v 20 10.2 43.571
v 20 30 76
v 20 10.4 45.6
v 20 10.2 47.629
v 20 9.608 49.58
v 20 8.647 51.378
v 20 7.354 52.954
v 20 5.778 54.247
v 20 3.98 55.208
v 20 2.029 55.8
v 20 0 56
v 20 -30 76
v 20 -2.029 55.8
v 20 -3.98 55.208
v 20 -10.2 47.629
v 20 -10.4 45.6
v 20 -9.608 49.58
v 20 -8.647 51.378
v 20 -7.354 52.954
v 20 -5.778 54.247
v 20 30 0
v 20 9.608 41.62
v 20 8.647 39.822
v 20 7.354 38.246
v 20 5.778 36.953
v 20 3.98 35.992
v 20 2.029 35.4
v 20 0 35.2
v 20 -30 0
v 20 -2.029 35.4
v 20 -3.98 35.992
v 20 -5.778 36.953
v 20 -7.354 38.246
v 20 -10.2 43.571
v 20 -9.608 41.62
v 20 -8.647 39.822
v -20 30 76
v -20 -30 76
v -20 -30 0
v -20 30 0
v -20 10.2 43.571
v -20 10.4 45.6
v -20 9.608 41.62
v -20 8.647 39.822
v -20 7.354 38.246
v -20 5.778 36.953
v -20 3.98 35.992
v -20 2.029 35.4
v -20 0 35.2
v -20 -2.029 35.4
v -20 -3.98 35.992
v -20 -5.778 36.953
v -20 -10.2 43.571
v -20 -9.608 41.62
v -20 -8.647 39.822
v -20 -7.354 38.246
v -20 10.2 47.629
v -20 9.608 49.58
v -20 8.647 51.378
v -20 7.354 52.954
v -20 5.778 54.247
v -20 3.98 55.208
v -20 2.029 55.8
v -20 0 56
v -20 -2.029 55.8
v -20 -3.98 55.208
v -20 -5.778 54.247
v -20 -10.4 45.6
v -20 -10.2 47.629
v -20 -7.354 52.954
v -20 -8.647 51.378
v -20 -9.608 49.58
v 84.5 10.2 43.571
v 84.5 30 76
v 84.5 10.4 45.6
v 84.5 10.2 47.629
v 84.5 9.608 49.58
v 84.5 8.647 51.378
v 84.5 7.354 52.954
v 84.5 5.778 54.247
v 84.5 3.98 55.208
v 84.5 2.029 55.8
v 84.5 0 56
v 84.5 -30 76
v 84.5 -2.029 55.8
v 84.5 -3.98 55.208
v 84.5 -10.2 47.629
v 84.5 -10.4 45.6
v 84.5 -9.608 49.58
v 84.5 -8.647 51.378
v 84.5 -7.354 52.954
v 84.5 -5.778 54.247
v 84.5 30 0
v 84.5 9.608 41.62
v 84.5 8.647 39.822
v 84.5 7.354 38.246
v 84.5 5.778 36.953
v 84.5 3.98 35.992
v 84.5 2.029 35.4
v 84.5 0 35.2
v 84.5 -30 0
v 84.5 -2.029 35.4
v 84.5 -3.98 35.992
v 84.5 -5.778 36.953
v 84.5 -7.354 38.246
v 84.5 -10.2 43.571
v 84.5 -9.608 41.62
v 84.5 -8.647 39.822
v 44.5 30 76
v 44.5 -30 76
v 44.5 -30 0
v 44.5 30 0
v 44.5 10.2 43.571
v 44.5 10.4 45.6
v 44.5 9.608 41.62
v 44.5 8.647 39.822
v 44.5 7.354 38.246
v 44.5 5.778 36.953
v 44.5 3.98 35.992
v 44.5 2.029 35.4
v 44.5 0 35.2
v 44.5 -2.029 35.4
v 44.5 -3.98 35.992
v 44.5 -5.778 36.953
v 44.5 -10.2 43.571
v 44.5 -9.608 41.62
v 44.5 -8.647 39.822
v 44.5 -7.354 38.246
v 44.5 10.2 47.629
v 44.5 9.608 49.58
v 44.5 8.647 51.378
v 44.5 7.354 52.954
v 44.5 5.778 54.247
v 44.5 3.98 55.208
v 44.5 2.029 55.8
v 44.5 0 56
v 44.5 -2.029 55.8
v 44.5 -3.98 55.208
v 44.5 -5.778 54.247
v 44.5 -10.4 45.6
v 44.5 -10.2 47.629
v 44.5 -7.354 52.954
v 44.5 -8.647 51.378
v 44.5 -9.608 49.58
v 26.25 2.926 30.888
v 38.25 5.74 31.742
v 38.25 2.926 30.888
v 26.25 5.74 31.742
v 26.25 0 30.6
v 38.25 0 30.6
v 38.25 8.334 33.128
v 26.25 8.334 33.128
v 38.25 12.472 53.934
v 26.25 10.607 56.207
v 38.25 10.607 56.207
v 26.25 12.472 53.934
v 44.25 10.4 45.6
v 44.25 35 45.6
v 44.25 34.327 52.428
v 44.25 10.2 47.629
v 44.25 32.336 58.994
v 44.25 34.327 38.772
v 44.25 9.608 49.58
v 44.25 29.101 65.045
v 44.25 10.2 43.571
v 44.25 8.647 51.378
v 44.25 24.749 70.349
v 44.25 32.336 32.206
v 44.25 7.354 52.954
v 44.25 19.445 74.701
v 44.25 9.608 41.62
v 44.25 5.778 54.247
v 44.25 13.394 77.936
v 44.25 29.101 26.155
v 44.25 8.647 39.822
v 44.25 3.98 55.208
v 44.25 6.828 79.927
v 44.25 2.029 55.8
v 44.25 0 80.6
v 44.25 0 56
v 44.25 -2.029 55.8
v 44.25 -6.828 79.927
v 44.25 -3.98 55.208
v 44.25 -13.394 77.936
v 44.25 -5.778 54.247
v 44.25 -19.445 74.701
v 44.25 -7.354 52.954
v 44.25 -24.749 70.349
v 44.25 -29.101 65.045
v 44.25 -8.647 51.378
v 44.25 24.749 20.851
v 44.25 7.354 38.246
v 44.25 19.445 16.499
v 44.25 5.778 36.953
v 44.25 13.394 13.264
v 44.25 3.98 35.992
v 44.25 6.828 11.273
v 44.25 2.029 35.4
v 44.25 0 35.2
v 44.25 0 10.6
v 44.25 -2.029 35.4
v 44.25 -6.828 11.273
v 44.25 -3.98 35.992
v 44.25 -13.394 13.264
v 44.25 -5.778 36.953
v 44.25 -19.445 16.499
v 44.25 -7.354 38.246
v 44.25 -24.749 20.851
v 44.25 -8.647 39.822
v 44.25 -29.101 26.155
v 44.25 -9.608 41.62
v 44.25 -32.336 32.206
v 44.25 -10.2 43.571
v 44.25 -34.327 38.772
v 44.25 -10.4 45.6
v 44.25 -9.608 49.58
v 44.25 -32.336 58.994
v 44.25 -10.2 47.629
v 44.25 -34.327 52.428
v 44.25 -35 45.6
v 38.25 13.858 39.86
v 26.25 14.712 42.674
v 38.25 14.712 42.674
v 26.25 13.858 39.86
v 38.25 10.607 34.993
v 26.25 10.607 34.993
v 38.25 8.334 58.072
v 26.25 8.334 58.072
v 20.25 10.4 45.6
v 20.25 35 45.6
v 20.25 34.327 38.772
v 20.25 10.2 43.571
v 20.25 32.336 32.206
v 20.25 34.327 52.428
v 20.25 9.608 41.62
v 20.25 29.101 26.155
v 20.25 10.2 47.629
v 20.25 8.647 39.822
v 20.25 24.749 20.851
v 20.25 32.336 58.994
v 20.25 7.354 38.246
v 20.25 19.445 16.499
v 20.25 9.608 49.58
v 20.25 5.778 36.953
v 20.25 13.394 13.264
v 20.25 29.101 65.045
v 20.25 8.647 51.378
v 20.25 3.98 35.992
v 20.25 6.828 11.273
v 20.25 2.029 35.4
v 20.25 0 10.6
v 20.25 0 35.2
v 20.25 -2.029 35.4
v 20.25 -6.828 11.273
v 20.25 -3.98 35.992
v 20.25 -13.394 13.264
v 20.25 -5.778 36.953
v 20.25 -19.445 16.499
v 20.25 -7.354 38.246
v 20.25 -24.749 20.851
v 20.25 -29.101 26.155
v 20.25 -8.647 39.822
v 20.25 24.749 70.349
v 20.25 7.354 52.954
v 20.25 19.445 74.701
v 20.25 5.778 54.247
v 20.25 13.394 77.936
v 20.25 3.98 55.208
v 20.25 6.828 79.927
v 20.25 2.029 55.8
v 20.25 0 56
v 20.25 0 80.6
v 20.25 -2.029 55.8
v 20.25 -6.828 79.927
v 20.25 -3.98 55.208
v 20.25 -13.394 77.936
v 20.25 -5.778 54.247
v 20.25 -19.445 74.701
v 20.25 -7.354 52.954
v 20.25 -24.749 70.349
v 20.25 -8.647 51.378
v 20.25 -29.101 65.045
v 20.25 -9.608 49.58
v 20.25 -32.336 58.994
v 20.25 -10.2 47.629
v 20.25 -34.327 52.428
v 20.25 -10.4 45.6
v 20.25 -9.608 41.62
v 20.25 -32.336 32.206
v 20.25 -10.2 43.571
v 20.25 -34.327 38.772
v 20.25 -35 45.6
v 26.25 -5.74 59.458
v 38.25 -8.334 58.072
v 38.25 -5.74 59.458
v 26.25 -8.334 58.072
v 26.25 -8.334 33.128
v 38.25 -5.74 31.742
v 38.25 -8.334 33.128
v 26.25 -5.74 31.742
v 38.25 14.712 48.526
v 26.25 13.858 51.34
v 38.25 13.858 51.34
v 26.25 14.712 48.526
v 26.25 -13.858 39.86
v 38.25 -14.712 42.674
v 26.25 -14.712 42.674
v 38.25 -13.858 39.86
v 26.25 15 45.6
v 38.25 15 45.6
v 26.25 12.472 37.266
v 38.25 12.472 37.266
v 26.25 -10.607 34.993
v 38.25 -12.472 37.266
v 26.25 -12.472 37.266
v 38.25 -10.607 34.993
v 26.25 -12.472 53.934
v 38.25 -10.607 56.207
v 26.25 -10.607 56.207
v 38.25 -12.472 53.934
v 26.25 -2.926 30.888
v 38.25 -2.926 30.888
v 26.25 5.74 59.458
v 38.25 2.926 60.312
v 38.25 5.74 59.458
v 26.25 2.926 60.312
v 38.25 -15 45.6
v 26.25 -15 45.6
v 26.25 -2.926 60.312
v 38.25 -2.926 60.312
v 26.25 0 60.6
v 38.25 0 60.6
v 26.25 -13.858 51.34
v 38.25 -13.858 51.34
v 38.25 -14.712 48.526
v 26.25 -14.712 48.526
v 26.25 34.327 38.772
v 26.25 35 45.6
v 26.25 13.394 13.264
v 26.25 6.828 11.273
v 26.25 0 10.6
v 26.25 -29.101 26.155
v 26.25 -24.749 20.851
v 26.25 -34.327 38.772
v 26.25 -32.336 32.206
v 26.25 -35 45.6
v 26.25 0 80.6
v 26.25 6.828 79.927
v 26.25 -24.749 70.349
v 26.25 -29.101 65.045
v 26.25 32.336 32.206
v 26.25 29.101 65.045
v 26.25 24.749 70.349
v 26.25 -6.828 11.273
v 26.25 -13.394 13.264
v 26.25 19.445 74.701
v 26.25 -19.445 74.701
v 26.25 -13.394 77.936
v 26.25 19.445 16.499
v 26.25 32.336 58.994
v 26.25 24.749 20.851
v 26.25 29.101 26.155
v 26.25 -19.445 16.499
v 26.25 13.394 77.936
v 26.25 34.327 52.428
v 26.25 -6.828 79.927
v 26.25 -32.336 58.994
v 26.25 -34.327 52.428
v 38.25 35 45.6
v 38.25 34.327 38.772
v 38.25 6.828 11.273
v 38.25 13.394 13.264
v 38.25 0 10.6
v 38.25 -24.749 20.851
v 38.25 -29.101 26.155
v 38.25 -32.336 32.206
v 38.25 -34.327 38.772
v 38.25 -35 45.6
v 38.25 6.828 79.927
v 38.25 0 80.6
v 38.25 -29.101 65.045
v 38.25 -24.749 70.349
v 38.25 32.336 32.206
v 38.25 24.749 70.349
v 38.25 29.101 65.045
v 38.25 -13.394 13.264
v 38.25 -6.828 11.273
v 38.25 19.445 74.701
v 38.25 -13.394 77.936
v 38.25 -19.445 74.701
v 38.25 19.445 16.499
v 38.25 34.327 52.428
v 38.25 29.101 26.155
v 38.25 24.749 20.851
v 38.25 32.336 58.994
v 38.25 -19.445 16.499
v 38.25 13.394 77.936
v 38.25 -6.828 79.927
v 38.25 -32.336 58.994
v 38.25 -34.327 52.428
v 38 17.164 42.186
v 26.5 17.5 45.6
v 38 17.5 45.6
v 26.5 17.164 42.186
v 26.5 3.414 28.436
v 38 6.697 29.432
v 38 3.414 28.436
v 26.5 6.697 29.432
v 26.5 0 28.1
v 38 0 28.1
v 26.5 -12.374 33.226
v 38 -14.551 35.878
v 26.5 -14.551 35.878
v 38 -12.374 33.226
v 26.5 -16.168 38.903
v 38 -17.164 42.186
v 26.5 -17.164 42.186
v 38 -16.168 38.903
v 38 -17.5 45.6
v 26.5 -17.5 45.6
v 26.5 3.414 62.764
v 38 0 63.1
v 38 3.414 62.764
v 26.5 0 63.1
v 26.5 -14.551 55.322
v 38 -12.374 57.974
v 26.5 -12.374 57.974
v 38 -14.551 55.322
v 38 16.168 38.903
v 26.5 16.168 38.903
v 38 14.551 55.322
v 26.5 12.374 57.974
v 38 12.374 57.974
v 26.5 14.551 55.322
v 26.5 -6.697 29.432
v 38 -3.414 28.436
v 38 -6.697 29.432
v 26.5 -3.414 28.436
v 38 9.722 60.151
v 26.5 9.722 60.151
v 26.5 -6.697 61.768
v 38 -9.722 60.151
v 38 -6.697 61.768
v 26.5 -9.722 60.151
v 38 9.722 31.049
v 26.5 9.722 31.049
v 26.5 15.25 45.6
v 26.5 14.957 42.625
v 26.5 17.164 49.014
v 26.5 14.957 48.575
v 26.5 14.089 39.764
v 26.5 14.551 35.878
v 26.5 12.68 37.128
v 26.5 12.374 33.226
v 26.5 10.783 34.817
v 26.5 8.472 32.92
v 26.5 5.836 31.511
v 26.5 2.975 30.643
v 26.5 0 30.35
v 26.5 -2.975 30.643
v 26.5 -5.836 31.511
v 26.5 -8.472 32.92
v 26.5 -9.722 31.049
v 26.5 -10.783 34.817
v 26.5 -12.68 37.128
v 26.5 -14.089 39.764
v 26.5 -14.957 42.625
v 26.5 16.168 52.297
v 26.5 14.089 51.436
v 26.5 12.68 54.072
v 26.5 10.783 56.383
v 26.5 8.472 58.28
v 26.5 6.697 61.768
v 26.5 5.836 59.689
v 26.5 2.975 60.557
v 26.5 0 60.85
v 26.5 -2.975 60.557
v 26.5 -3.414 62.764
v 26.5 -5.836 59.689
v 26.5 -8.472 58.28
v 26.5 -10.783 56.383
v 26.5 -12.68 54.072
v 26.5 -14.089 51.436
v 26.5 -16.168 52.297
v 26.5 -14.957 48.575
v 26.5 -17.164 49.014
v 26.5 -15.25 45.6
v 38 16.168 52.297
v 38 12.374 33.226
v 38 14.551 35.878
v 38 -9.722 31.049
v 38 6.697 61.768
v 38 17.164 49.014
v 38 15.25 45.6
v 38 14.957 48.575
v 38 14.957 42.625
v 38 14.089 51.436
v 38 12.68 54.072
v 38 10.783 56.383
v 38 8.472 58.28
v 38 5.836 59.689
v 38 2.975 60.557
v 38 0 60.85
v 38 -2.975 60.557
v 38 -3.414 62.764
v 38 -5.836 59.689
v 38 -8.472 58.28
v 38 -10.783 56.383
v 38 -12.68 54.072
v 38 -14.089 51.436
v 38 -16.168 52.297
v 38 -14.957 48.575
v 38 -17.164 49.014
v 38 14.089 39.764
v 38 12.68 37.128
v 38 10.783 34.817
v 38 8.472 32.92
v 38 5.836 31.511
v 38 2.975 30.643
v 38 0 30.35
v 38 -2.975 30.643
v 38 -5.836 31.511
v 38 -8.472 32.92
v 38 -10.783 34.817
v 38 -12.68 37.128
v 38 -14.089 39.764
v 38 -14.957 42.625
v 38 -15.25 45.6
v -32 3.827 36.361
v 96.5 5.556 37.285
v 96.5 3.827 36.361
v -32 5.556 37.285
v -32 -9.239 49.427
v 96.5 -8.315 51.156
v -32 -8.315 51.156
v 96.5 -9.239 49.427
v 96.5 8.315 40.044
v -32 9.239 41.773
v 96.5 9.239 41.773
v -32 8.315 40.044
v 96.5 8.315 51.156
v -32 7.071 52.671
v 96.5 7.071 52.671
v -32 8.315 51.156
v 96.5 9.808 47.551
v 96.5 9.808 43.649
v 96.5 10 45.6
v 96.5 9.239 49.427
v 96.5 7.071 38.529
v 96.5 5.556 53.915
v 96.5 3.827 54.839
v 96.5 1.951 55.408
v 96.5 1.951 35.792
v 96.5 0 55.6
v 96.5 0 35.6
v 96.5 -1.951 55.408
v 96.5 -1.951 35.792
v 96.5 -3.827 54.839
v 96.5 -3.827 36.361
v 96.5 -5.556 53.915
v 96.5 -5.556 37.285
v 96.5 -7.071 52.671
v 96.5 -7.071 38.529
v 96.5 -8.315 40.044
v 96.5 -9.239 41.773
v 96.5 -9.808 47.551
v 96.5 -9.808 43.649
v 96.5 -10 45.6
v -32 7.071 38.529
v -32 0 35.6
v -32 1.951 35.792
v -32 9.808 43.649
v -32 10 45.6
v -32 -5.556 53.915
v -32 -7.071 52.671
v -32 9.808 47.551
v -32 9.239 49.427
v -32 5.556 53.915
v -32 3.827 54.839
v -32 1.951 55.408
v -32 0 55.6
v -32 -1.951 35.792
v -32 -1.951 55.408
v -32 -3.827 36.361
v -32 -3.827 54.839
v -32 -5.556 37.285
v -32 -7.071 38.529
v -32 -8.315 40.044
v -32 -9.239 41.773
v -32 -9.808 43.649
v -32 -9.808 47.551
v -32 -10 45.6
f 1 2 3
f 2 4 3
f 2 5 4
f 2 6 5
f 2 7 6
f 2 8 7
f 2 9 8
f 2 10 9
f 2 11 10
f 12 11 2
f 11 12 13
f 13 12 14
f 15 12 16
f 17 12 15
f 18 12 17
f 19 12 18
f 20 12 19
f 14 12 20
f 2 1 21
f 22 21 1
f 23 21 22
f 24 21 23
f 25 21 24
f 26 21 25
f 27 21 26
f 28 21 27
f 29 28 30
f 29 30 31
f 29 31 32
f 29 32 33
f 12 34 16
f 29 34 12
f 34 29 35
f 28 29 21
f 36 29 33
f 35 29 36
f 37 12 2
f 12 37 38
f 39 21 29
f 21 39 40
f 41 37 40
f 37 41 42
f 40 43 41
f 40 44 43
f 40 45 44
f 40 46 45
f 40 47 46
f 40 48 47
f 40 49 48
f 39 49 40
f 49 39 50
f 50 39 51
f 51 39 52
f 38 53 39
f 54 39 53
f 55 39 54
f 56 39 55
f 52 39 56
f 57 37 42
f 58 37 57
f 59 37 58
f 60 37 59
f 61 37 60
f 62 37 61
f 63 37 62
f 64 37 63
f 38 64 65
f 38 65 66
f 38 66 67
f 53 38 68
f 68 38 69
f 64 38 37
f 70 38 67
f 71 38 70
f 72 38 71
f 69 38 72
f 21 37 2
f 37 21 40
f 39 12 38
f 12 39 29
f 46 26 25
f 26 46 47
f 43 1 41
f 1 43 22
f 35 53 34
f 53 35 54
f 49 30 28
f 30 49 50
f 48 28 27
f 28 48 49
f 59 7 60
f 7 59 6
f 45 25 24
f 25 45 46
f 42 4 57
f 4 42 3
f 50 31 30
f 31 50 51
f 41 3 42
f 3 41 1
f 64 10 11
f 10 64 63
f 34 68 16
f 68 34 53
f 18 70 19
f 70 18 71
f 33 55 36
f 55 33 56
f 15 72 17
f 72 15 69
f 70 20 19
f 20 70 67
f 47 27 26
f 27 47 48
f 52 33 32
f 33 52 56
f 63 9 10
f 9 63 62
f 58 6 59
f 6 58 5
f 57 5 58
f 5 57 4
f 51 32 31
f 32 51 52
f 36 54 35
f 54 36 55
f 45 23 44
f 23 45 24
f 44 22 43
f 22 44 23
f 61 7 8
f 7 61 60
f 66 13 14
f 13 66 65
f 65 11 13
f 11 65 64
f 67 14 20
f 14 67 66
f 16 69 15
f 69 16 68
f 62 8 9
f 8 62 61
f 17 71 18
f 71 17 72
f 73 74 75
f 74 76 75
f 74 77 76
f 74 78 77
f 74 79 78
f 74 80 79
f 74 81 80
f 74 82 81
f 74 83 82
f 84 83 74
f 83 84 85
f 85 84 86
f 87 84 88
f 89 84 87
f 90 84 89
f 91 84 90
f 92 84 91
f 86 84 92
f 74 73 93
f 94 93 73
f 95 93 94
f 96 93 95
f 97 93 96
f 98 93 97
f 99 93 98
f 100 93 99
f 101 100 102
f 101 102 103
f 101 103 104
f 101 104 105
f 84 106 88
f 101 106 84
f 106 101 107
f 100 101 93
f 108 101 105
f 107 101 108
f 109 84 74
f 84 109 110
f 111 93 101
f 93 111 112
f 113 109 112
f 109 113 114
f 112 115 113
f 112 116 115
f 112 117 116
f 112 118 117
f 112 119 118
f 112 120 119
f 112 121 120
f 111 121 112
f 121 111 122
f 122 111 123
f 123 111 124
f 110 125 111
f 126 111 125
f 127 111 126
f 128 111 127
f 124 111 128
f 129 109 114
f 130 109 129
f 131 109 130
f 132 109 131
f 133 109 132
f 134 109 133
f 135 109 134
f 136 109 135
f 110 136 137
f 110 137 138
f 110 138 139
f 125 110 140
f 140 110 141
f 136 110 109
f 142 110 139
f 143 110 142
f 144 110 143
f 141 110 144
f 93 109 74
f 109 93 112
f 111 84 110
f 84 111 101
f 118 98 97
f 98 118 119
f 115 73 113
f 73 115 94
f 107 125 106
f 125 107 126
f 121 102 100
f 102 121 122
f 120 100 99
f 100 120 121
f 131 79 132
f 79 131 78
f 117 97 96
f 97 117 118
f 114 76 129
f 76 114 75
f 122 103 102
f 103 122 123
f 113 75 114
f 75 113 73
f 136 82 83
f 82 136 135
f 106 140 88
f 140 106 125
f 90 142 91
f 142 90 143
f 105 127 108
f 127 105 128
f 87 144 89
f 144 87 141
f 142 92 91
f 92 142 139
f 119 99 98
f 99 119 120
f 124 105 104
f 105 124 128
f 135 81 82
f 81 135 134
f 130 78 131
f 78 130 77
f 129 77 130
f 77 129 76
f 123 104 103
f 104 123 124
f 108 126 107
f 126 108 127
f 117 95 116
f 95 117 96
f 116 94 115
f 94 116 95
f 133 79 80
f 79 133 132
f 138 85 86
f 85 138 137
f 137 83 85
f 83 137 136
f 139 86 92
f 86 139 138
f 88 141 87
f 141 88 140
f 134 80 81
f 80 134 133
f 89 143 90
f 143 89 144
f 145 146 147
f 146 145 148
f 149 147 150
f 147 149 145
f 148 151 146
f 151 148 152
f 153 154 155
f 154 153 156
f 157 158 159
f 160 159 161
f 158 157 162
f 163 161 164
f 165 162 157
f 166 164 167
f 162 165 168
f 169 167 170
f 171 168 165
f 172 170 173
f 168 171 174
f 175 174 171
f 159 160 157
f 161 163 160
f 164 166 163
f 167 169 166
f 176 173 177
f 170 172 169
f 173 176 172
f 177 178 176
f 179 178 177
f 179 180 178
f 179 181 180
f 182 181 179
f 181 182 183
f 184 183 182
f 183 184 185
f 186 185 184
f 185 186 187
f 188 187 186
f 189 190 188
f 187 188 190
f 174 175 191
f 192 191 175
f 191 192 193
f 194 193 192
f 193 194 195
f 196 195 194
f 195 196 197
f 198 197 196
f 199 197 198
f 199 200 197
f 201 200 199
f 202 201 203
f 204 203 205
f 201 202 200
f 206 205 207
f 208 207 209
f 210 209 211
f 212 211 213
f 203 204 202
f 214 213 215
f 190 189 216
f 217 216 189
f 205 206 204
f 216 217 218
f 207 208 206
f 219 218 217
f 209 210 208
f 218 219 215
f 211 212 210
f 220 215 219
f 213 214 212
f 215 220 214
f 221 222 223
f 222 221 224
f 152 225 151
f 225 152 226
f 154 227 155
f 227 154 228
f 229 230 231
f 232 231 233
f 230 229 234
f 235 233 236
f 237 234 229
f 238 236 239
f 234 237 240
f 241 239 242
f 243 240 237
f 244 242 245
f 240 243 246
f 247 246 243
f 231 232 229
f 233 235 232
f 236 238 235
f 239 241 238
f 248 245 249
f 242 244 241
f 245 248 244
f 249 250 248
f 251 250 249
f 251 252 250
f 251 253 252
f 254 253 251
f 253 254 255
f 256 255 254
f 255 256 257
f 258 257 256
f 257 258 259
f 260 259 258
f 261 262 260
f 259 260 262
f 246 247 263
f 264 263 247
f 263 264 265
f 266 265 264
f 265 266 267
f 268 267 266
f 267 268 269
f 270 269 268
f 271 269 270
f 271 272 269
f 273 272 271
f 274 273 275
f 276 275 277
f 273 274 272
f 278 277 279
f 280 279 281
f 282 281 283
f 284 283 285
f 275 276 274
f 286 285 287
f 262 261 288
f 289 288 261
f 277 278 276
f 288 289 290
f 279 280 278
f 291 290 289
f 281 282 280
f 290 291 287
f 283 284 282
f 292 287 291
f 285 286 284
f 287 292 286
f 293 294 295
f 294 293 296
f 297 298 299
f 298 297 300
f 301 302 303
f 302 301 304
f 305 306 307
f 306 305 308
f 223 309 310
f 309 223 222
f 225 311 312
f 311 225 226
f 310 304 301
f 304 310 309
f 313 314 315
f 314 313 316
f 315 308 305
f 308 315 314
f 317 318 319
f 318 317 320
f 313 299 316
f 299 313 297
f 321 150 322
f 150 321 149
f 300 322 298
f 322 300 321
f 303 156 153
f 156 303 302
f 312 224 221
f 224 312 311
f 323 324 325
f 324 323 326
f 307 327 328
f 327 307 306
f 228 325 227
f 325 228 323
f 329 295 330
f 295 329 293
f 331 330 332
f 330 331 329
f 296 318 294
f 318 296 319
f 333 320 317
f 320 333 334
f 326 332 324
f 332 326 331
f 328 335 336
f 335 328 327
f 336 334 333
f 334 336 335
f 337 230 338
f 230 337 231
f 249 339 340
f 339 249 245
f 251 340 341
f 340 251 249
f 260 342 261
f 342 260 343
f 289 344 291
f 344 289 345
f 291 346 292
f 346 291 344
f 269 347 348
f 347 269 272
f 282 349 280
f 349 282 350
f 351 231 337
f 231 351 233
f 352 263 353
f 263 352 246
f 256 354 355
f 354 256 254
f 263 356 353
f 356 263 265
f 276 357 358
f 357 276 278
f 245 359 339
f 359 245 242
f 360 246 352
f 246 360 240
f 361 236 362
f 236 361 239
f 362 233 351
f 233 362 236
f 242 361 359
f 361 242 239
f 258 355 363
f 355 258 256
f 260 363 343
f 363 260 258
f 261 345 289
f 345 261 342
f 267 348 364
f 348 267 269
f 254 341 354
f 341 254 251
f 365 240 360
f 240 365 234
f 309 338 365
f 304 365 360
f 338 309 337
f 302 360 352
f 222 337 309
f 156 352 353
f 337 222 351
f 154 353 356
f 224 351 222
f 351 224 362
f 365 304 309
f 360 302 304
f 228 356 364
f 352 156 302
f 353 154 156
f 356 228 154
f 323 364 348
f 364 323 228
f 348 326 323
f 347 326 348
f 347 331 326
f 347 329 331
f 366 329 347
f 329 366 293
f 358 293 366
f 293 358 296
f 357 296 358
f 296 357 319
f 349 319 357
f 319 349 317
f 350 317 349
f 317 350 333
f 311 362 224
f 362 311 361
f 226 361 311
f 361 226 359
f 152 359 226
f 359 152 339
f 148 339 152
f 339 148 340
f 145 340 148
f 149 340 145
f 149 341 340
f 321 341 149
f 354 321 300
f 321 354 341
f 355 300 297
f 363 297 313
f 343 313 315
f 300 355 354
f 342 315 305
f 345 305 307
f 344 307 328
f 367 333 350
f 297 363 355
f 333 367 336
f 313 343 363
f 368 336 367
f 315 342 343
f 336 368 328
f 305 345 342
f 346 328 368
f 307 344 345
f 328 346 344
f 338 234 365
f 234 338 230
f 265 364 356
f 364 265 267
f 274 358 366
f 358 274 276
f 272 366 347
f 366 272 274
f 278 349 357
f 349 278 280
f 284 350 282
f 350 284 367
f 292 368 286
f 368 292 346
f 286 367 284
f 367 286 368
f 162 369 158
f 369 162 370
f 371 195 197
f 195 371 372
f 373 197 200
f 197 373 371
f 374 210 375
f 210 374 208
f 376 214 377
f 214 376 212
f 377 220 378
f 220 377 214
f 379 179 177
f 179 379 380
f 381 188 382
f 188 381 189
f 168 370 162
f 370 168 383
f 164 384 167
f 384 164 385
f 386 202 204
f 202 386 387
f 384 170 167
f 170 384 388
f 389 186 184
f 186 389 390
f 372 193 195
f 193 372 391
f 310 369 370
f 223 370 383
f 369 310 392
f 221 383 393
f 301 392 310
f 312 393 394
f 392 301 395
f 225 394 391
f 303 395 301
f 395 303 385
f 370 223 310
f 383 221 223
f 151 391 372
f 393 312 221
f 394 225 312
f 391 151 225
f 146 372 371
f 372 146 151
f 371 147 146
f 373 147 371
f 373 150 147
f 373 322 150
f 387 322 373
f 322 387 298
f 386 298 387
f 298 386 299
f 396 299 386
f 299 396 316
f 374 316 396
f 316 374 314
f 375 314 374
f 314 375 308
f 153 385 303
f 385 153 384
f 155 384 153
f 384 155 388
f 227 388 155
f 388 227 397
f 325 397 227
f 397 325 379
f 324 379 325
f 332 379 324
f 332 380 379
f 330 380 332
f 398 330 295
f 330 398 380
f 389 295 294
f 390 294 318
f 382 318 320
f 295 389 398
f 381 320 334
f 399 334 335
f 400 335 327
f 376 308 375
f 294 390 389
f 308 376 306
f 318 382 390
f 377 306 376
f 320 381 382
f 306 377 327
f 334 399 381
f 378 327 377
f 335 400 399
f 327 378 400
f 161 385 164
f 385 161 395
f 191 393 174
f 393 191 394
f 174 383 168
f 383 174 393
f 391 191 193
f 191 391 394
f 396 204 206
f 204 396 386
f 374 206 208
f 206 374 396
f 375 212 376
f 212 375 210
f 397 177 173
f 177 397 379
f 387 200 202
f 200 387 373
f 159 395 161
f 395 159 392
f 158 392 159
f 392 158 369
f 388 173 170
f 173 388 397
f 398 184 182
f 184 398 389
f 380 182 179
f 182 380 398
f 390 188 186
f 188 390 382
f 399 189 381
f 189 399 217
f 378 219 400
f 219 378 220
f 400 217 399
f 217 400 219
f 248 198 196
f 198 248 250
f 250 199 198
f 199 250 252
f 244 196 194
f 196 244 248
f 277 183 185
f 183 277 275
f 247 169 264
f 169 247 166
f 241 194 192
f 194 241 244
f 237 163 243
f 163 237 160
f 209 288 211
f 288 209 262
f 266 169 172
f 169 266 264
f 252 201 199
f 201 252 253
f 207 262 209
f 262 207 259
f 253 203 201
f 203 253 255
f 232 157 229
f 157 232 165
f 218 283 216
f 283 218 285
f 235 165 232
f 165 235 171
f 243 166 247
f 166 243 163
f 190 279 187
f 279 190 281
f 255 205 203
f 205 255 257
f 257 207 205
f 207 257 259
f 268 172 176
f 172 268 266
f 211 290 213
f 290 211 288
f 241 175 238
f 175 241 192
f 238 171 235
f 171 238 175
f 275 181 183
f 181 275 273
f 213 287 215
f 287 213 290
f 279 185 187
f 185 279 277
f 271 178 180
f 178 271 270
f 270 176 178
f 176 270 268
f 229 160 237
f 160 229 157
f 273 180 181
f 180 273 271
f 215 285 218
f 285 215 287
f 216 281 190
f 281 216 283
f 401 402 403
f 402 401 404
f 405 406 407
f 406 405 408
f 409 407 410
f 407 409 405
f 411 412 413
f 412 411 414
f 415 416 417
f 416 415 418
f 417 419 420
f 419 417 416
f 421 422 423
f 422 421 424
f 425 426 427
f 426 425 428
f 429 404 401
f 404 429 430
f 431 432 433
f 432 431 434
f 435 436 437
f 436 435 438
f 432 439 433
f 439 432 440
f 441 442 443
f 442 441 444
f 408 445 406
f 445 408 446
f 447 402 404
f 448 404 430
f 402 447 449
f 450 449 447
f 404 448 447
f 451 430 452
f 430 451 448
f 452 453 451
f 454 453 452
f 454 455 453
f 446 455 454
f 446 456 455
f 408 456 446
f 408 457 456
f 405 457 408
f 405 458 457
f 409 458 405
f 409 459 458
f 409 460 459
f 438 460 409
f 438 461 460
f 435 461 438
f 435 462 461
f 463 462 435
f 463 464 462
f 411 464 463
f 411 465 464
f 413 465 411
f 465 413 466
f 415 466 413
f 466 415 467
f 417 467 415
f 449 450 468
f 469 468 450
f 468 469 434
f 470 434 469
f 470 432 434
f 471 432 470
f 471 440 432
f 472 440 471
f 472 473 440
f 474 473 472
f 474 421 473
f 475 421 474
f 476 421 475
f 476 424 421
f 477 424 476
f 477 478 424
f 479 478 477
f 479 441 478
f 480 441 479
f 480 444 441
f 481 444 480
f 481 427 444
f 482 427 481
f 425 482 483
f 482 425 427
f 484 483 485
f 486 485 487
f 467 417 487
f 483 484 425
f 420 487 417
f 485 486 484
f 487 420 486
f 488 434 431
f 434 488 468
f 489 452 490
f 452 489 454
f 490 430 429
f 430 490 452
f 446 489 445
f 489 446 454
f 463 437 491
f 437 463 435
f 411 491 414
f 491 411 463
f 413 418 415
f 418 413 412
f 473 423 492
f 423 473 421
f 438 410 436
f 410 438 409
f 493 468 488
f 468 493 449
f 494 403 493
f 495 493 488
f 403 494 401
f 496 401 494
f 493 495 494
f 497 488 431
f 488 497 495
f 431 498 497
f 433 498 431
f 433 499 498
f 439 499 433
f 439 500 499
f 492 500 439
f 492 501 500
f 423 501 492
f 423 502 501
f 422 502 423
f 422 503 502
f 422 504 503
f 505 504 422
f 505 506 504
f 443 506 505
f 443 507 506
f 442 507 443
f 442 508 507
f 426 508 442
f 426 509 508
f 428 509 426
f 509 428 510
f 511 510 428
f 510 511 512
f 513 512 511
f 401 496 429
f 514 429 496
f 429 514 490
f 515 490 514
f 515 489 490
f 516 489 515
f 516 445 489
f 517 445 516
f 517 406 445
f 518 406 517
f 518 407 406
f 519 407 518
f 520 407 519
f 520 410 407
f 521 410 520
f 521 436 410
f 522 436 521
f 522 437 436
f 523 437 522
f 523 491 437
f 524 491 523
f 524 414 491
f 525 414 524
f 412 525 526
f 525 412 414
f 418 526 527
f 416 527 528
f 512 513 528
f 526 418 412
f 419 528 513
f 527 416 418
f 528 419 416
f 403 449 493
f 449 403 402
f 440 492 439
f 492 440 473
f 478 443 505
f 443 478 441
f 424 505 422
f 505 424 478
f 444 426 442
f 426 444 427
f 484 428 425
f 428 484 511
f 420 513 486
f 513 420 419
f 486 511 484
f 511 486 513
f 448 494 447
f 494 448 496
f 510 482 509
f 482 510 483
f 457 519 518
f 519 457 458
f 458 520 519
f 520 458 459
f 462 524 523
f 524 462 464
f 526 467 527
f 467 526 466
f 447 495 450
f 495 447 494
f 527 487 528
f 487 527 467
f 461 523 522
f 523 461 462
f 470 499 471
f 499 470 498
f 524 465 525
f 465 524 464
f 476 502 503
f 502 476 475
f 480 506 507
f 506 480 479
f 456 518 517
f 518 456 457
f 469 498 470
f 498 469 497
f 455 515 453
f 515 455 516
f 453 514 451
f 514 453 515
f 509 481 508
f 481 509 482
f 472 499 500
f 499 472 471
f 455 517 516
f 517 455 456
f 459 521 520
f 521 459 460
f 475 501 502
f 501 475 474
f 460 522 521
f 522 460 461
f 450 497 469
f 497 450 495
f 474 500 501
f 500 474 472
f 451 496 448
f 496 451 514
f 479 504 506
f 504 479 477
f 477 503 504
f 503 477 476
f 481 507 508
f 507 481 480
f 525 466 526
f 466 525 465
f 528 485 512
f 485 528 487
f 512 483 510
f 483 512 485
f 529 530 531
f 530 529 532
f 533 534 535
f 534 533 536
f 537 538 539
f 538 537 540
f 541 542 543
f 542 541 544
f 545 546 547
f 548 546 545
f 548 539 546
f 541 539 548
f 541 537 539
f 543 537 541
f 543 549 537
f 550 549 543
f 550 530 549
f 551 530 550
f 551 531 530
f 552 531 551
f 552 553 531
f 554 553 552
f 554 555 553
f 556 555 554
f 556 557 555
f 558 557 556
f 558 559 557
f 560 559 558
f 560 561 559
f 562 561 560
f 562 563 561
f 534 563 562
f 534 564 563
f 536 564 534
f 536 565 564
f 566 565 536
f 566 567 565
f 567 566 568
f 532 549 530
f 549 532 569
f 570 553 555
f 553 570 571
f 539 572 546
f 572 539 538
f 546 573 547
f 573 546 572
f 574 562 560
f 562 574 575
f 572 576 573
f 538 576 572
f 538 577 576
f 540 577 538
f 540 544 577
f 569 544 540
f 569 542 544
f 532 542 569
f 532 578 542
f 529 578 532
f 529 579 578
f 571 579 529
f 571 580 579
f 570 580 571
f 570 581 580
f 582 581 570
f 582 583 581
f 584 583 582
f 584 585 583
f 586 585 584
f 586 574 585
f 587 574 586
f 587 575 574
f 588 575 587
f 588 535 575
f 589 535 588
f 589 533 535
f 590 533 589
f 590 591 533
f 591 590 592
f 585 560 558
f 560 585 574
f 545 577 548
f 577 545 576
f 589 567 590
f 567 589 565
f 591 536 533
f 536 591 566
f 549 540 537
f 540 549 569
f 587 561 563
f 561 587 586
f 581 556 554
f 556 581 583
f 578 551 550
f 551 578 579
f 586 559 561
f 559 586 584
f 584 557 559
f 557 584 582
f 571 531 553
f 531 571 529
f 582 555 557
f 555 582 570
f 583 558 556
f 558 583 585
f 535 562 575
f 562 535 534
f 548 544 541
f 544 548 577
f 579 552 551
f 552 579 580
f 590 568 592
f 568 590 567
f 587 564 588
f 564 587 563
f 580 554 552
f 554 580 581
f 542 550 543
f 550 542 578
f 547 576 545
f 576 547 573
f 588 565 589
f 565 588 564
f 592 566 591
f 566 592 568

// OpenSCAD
$fn = 32;

// ------------------------------------------------------------------------
// Pulley assembly: d70 pulley with a belt, shaft d20
// Every part is its own module, assembly() places them once.
// ------------------------------------------------------------------------

// --- part 1 ---
module support1() {
  difference() {
    translate([-20, -30, 0]) cube([40, 60, 76]);
    translate([0, 0, 45.6]) rotate([0, 90, 0]) cylinder(h = 42, d = 20.8, center = true);
  }
}

// --- part 2 ---
module support2() {
  difference() {
    translate([-20, -30, 0]) cube([40, 60, 76]);
    translate([0, 0, 45.6]) rotate([0, 90, 0]) cylinder(h = 42, d = 20.8, center = true);
  }
}

// --- part 3 ---
module shaft() {
  translate([0, 0, -64.25]) cylinder(h = 128.5, d = 20);
}

// --- part 4 ---
module pulley() {
  difference() {
    union() {
      cylinder(h = 24, d = 30);
      cylinder(h = 6, d = 70);
      translate([0, 0, 18]) cylinder(h = 6, d = 70);
    }
    translate([0, 0, -1]) cylinder(h = 26, d = 20.8);
  }
}

// --- part 5 ---
module belt() {
  difference() {
      translate([0, 0, 0]) cylinder(h = 11.5, d = 35);
      translate([0, 0, -1]) cylinder(h = 13.5, d = 30.5);
    }
}

// --- assembly ---
module assembly() {
  translate([0, 0, 0]) rotate([0, 0, 0]) support1();
  translate([64.5, 0, 0]) rotate([0, 0, 0]) support2();
  translate([32.25, 0, 45.6]) rotate([0, 90, 0]) shaft();
  translate([20.25, 0, 45.6]) rotate([0, 90, 0]) pulley();
  translate([26.5, 0, 45.6]) rotate([0, 90, 0]) belt();
}

assembly();
